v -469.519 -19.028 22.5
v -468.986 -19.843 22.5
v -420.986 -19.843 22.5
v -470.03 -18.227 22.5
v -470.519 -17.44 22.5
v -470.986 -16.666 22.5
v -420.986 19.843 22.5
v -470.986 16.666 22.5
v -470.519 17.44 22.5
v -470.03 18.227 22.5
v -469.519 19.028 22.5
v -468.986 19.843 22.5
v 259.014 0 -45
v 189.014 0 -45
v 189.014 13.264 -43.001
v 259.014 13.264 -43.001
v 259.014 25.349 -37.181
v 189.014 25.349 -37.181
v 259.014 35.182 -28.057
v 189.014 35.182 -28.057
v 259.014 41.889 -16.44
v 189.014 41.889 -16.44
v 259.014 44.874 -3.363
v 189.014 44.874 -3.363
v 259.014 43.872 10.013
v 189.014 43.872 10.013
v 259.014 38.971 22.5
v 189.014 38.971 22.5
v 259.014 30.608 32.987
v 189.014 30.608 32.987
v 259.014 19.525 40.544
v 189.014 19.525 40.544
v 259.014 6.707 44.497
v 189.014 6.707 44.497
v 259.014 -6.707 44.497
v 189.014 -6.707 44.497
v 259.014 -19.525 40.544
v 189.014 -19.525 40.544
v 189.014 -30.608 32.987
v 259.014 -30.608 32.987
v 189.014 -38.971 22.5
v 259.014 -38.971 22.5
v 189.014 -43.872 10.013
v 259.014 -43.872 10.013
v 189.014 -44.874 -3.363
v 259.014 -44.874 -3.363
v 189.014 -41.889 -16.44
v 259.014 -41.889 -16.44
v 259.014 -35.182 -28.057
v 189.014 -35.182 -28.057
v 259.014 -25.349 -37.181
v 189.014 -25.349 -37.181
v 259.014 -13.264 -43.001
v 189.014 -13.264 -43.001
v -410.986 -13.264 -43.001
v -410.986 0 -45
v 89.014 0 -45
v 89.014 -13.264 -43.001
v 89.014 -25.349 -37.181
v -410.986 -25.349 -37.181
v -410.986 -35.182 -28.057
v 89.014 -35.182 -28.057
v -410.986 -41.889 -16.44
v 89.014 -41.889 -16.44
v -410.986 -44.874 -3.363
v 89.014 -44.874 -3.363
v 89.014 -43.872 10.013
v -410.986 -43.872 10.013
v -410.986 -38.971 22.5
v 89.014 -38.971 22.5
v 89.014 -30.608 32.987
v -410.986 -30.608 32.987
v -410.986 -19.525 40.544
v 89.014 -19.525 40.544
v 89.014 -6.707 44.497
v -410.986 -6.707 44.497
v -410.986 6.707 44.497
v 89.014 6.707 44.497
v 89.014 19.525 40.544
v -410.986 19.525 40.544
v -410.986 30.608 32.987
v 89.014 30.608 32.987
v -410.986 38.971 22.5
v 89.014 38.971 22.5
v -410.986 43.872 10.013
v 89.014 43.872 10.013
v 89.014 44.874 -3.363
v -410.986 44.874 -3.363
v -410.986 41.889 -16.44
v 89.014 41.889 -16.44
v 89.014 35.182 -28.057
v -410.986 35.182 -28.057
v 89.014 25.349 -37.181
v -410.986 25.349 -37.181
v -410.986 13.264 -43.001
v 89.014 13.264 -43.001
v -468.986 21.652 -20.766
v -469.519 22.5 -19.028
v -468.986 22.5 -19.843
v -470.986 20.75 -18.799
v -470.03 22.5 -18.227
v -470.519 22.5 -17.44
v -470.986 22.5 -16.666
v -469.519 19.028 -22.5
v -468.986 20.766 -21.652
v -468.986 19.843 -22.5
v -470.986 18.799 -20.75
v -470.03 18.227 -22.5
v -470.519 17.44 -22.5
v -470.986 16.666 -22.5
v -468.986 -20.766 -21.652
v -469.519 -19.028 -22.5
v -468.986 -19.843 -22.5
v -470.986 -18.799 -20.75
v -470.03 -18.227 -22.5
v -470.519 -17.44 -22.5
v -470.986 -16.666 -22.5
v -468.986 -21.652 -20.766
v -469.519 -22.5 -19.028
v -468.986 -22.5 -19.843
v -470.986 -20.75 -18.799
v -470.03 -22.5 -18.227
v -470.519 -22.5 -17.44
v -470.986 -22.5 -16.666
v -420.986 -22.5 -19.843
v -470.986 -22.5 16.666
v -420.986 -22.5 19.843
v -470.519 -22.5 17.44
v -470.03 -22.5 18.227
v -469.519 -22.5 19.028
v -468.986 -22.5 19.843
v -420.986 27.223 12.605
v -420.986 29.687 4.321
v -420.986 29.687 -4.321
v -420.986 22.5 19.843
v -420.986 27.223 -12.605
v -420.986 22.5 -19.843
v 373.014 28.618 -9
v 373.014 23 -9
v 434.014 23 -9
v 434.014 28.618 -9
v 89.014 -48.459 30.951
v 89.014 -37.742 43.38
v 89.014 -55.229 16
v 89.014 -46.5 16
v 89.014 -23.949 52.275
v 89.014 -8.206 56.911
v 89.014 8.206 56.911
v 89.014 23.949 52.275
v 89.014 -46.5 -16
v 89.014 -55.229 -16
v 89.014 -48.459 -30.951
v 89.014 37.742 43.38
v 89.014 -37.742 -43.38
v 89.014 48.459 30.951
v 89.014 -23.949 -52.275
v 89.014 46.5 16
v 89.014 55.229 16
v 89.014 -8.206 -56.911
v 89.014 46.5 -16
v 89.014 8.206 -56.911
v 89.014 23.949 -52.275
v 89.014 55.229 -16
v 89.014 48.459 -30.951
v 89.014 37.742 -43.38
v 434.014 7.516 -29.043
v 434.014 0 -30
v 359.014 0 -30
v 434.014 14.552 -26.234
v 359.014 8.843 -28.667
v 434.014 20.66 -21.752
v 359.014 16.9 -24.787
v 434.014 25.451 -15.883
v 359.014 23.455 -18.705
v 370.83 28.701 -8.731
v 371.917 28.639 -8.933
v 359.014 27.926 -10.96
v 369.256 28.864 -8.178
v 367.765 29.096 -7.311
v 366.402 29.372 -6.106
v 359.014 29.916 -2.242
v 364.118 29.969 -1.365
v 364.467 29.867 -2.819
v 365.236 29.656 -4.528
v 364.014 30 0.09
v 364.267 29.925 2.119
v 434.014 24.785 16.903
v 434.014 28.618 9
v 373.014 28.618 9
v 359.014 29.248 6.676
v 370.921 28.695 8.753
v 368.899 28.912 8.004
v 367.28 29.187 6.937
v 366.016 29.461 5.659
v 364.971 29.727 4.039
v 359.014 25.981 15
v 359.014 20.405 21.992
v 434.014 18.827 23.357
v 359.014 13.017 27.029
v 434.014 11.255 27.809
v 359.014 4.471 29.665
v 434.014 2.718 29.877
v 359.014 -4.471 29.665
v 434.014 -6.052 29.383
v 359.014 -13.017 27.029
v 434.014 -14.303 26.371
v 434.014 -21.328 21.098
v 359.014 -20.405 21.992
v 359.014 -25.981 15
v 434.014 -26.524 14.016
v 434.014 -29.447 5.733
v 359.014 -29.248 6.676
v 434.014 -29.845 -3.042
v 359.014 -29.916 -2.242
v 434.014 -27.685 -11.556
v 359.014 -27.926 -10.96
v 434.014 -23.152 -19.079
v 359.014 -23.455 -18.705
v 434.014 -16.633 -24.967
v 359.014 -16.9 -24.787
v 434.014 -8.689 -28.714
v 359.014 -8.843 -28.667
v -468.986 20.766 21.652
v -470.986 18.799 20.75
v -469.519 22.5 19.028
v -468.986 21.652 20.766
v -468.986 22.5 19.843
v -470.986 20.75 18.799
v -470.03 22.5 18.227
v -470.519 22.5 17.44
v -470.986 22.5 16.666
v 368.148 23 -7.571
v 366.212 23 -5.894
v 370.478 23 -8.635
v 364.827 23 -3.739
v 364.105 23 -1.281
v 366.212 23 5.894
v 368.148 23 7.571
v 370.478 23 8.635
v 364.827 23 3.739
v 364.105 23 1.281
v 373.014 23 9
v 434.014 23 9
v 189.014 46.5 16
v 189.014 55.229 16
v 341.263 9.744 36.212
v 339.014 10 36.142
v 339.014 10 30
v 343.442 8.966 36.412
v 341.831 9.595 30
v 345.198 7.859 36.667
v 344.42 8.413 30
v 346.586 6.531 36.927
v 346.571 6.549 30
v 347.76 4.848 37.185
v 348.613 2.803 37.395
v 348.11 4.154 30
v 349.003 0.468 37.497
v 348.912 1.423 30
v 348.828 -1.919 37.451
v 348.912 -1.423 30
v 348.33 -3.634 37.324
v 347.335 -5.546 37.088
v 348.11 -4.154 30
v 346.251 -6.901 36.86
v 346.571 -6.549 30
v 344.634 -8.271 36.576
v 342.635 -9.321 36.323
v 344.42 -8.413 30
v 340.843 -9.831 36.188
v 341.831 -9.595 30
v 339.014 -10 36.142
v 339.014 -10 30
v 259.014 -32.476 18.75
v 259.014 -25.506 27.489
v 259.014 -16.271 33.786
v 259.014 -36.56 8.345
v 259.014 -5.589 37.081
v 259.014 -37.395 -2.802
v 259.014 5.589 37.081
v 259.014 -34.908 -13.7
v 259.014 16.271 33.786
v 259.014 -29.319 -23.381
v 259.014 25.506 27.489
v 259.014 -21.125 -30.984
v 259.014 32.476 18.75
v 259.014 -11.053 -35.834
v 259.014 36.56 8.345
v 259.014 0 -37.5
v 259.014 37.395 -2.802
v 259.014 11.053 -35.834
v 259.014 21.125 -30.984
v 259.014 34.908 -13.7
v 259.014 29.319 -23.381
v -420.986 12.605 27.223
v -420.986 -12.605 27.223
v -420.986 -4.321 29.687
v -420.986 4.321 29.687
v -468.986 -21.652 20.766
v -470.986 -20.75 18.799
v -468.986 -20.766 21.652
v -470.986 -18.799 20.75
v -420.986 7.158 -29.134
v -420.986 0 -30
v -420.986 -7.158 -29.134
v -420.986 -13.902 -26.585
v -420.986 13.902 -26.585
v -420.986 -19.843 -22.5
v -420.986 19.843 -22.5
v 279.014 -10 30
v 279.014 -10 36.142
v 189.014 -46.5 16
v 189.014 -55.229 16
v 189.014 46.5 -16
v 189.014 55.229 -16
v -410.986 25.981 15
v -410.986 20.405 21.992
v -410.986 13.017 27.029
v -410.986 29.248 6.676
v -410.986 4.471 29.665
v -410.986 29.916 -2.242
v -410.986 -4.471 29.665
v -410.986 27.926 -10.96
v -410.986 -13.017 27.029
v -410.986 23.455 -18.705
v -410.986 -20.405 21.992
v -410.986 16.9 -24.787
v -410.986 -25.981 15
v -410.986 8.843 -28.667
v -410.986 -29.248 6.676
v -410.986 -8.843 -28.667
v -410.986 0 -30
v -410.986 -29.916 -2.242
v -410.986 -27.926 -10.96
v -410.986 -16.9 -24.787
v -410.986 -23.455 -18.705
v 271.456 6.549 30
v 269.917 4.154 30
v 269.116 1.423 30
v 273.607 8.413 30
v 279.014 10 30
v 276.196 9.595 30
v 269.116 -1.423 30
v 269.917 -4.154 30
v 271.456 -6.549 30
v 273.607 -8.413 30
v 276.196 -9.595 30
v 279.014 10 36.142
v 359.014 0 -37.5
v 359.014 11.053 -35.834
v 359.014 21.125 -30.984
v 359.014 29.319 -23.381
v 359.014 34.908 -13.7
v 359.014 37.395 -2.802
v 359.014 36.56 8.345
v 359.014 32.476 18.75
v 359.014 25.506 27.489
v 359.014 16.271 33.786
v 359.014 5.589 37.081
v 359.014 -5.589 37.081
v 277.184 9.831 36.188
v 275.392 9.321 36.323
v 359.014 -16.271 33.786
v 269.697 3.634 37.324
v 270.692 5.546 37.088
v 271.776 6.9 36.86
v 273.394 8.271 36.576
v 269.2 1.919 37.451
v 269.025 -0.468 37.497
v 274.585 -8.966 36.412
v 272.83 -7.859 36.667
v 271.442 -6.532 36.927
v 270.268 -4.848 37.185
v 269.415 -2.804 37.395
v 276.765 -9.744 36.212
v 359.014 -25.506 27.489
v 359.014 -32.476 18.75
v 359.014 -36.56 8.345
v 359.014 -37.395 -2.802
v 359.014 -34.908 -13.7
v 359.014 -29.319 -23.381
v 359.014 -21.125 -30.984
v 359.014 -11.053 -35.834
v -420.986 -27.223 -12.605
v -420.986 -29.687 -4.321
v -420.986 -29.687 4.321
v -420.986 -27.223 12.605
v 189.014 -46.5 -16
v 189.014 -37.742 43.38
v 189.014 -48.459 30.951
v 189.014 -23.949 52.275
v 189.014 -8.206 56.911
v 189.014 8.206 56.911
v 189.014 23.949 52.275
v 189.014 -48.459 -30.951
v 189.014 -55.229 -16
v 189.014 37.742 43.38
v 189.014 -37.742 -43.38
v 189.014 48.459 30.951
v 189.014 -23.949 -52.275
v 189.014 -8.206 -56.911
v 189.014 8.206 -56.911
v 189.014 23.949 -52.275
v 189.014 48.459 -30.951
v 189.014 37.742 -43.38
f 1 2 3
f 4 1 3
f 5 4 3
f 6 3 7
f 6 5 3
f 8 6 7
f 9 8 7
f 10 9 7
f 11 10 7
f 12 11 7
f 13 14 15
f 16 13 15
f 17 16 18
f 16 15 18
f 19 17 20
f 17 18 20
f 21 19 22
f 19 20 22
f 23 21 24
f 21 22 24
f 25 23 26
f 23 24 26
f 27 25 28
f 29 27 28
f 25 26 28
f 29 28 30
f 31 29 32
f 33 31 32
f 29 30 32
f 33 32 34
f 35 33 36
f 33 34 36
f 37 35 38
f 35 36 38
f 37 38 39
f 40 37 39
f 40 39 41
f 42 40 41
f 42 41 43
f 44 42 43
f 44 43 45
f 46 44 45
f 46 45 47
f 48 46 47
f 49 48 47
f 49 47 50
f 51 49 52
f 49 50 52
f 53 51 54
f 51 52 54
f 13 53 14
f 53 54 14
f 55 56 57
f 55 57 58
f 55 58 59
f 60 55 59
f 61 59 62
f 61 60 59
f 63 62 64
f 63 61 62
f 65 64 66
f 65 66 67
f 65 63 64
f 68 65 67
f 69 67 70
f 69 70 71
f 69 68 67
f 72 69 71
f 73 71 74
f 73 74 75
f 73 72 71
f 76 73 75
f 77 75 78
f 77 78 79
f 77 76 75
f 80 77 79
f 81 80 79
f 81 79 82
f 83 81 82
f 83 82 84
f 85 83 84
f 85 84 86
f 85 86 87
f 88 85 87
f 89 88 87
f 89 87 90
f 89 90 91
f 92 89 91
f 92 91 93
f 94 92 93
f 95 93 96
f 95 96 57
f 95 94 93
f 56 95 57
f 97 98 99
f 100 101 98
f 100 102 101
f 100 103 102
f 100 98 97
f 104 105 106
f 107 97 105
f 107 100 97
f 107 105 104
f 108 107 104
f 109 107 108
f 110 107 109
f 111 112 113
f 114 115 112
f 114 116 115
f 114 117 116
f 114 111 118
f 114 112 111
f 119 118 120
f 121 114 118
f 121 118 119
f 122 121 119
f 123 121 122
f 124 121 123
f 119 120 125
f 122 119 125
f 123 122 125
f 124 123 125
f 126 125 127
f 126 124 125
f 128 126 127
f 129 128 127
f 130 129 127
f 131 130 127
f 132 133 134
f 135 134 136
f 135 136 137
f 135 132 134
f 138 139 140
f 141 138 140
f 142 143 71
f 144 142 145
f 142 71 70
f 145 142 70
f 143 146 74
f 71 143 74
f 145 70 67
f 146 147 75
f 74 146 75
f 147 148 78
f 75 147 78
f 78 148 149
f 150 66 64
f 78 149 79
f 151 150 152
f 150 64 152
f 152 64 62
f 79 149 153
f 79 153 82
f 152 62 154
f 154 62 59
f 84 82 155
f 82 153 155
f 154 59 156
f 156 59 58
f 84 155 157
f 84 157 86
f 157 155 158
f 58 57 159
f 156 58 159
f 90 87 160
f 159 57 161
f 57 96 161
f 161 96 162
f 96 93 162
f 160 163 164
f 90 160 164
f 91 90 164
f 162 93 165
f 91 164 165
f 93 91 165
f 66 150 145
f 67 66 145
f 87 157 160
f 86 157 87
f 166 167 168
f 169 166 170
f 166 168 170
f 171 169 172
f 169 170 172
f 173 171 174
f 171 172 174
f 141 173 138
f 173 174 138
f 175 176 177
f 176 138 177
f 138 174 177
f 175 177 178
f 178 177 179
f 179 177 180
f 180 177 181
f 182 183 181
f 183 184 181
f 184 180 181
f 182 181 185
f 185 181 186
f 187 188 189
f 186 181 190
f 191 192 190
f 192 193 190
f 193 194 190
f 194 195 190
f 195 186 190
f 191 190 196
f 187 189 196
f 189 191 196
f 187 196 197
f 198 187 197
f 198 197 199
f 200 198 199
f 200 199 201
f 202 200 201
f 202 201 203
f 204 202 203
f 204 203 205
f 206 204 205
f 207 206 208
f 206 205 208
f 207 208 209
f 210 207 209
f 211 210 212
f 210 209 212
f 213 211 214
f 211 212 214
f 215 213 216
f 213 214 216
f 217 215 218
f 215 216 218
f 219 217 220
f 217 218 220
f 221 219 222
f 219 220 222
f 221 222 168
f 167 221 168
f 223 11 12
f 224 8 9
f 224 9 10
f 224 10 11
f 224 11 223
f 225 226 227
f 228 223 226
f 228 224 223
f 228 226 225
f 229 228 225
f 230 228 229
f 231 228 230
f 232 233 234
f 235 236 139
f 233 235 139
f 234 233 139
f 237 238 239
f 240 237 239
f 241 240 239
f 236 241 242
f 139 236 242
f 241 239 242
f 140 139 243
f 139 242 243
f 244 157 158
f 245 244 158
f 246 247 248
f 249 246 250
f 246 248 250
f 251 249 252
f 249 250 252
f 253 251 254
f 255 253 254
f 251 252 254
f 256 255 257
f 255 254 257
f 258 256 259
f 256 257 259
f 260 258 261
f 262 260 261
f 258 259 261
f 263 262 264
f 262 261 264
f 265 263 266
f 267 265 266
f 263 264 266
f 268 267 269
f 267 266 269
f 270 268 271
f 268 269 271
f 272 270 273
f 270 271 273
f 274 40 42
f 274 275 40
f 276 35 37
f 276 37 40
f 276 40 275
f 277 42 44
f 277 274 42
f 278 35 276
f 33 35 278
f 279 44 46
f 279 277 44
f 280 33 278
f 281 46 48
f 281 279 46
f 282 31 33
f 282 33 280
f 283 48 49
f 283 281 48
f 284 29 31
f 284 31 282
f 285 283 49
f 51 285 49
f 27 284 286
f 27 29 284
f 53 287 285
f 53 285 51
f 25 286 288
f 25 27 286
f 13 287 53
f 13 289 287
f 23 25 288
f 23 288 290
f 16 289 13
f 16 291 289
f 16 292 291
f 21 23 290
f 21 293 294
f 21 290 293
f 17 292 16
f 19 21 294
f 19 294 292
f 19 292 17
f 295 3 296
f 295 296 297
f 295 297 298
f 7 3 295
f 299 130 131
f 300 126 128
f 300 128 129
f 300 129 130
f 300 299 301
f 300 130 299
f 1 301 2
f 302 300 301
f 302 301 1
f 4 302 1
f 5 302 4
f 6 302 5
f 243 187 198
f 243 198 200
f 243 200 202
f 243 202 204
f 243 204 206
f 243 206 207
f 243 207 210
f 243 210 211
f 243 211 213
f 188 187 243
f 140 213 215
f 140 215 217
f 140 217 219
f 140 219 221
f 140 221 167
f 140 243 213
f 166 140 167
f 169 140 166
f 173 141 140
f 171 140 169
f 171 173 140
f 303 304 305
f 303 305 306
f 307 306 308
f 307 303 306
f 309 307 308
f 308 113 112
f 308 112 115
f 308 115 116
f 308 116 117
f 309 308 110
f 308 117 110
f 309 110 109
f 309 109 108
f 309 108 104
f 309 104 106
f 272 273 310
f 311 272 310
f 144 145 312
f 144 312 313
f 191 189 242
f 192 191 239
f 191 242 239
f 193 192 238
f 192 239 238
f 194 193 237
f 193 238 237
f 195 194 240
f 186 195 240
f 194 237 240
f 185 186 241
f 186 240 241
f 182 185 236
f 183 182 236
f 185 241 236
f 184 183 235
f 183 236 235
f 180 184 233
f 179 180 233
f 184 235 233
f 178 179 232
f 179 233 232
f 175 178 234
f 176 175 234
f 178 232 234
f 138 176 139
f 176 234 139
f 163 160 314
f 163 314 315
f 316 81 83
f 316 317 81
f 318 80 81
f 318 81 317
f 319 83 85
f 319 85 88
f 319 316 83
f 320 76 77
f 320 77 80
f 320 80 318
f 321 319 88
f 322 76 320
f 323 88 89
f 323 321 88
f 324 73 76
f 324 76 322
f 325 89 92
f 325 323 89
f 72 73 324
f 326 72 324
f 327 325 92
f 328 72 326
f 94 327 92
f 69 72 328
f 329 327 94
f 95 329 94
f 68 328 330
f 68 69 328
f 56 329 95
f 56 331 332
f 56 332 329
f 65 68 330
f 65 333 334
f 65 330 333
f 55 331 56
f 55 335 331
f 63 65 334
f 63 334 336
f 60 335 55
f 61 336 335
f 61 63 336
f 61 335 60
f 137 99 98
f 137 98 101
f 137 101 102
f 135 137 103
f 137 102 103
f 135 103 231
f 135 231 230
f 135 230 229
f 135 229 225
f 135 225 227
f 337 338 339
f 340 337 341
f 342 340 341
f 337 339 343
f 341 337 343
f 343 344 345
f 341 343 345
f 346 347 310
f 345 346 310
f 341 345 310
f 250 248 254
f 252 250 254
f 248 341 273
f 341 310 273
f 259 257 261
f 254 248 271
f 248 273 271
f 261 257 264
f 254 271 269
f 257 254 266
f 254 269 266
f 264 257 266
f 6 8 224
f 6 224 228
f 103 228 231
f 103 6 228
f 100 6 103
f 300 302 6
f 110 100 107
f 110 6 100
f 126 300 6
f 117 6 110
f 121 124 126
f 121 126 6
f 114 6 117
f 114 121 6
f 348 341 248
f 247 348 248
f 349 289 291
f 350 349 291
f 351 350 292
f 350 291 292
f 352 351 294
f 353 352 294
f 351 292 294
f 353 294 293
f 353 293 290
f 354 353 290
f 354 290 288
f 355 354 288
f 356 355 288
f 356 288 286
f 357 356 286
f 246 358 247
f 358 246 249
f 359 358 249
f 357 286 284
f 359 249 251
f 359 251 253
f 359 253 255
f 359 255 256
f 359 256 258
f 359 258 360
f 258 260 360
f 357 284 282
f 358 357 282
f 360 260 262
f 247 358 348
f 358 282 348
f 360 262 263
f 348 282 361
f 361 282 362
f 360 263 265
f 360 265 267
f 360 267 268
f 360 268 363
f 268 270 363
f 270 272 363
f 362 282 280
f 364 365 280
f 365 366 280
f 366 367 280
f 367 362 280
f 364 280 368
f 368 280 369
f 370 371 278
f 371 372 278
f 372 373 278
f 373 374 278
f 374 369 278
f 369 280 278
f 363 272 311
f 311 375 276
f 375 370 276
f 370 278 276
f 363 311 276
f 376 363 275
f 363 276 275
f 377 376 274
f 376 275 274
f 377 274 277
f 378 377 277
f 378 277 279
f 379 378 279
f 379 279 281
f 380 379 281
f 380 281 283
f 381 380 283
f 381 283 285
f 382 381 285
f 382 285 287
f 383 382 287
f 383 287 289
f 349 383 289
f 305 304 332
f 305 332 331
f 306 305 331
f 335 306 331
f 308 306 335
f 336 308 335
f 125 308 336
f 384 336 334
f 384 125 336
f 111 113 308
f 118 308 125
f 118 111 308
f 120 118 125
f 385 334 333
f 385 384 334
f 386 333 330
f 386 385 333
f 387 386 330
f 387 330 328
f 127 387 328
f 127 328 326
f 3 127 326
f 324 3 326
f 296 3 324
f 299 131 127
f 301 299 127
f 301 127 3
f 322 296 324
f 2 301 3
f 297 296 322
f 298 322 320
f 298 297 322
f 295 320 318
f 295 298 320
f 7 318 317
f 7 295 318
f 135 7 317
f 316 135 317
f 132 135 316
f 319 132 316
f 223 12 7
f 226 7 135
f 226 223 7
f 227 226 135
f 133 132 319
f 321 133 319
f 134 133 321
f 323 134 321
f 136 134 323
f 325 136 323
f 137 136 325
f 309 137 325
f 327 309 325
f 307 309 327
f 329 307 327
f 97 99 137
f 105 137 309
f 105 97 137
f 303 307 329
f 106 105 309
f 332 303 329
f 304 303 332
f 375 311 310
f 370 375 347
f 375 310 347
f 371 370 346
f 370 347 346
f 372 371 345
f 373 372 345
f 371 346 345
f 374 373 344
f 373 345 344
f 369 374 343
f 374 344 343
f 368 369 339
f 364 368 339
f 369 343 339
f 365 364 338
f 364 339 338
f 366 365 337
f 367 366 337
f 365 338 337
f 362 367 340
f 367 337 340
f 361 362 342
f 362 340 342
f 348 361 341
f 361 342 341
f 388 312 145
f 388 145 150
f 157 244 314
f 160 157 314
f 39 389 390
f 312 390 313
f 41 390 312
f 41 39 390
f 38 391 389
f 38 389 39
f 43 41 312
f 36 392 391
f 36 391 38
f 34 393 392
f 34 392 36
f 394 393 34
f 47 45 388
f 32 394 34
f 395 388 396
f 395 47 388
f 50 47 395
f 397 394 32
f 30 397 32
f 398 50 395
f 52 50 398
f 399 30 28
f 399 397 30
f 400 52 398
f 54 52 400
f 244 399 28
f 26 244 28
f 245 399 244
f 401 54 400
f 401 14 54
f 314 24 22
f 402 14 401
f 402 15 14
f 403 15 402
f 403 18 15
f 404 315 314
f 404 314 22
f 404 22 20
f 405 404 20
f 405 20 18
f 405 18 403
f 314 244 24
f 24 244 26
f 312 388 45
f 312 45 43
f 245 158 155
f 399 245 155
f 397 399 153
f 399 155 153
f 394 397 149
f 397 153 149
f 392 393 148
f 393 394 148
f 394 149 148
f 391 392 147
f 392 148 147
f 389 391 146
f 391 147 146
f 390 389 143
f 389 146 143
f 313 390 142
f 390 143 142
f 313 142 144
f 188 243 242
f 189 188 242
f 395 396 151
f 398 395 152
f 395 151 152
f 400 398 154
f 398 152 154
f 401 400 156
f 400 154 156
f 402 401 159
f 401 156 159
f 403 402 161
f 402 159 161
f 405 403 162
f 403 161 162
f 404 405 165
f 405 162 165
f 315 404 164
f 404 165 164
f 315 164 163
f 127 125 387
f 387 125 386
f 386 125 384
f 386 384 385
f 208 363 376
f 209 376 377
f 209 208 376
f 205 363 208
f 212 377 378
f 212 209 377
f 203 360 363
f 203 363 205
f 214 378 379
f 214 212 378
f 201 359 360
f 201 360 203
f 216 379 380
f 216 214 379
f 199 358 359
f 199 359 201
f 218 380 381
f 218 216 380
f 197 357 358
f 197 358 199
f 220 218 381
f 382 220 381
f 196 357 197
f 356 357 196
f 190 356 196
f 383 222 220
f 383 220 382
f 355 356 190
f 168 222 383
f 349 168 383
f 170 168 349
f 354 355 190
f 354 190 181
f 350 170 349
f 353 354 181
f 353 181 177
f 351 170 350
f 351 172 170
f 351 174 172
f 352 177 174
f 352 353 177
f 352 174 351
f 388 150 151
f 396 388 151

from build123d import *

# Parameters (mm, degrees)
SKETCH2_R          = 11.5
EXTRUDE1_DEPTH     = 20
SKETCH3_R          = 9
EXTRUDE2_DEPTH     = 14
SKETCH4_R          = 7.5
EXTRUDE3_DEPTH     = 20
SKETCH5_R          = 6
EXTRUDE4_DEPTH     = 15
EXTRUDE5_START     = 100
SKETCH6_R          = 9
EXTRUDE5_DEPTH     = 100
EXTRUDE6_START     = 12
SKETCH7_R          = 6
EXTRUDE6_DEPTH     = 12
SCALE1_SCALE       = 5
SKETCH9_W          = 32
SKETCH9_H          = 18
CUT_EXTRUDE1_DEPTH = 665.990601438
CUT_EXTRUDE2_DEPTH = 481.888860648
CUT_EXTRUDE3_DEPTH = 483.218372884
CHAMFER1_SIZE      = 2
SKETCH12_W         = 80
SKETCH12_H         = 80
SKETCH12_W_2       = 45
SKETCH12_H_2       = 45
CUT_EXTRUDE4_DEPTH = 50


with BuildPart() as part:
    # Sketch2 → Extrude1 (new body)
    with BuildSketch(Plane(origin=(0, 0, 0), x_dir=(0, 0, -1), z_dir=(1, 0, 0))):
        Circle(SKETCH2_R)
    extrude(amount=EXTRUDE1_DEPTH)

    # Sketch3 → Extrude2 (add)
    with BuildSketch(Plane(origin=(20, 0, 0), x_dir=(0, 0, -1), z_dir=(1, 0, 0))):
        Circle(SKETCH3_R)
    extrude(amount=EXTRUDE2_DEPTH)

    # Sketch4 → Extrude3 (add)
    with BuildSketch(Plane(origin=(34, 0, 0), x_dir=(0, 0, -1), z_dir=(1, 0, 0))):
        Circle(SKETCH4_R)
    extrude(amount=EXTRUDE3_DEPTH)

    # Sketch5 → Extrude4 (add)
    with BuildSketch(Plane(origin=(54, 0, 0), x_dir=(0, 0, -1), z_dir=(1, 0, 0))):
        Circle(SKETCH5_R)
    extrude(amount=EXTRUDE4_DEPTH)

    # Sketch6 → Extrude5 (add)
    with BuildSketch(Plane.ZY.offset(EXTRUDE5_START)):
        with Locations(Location((0, 0, 0), (0, 0, 180))):
            Circle(SKETCH6_R)
    extrude(amount=-EXTRUDE5_DEPTH)

    # Sketch7 → Extrude6 (add)
    with BuildSketch(Plane.ZY.offset(100).offset(EXTRUDE6_START)):
        with Locations(Location((0, 0, 0), (0, 0, 180))):
            Circle(SKETCH7_R)
    extrude(amount=-EXTRUDE6_DEPTH)


with BuildPart() as part_1:
    # Scale1: scaled about (-22.253434459, 0, 0)
    add(part.part.scale(SCALE1_SCALE).moved(Location((89.013737836, 0, 0))))

    # Sketch9 → Cut-Extrude1 (cut, through all)
    with BuildSketch(Plane(origin=(189.013737836, 0, 0), x_dir=(0, 0, -1), z_dir=(1, 0, 0))):
        with Locations((0, 55.5)):
            Rectangle(SKETCH9_W, SKETCH9_H)
    cut_extrude1 = extrude(amount=-CUT_EXTRUDE1_DEPTH, mode=Mode.SUBTRACT)

    # Mirror1: Cut-Extrude1 across plane
    add(cut_extrude1.mirror(Plane.ZX), mode=Mode.SUBTRACT)

    # Sketch10 → Cut-Extrude2 (cut, through all)
    with BuildSketch(Plane(origin=(0, 23, 0), x_dir=(-1, 0, 0), z_dir=(0, 1, 0))):
        with BuildLine():
            Line((-373.013737836, -9), (-434.013737836, -9))
            Line((-434.013737836, -9), (-434.013737836, 9))
            Line((-434.013737836, 9), (-373.013737836, 9))
            ThreePointArc((-373.013737836, 9), (-364.013737836, 0), (-373.013737836, -9))
        make_face()
    extrude(amount=CUT_EXTRUDE2_DEPTH, mode=Mode.SUBTRACT)

    # Sketch11 → Cut-Extrude3 (cut, through all)
    with BuildSketch(Plane(origin=(0, 0, 30), x_dir=(-1, 0, 0), z_dir=(0, 0, 1))):
        with BuildLine():
            Line((-339.013737836, 10), (-279.013737836, 10))
            ThreePointArc((-279.013737836, 10), (-269.013737836, 0), (-279.013737836, -10))
            Line((-279.013737836, -10), (-339.013737836, -10))
            ThreePointArc((-339.013737836, -10), (-349.013737836, 0), (-339.013737836, 10))
        make_face()
    extrude(amount=CUT_EXTRUDE3_DEPTH, mode=Mode.SUBTRACT)

    # Chamfer1
    chamfer1_edges = [part_1.edges().sort_by_distance(p)[0] for p in [
        (-470.986262164, 0, 30),
    ]]
    chamfer(chamfer1_edges, length=CHAMFER1_SIZE)

    # Sketch12 → Cut-Extrude4 (cut)
    with BuildSketch(Plane.ZY.offset(470.986262164)):
        Rectangle(SKETCH12_W, SKETCH12_H)
        Rectangle(SKETCH12_W_2, SKETCH12_H_2, mode=Mode.SUBTRACT)
    extrude(amount=-CUT_EXTRUDE4_DEPTH, mode=Mode.SUBTRACT)


solid = part_1.part
